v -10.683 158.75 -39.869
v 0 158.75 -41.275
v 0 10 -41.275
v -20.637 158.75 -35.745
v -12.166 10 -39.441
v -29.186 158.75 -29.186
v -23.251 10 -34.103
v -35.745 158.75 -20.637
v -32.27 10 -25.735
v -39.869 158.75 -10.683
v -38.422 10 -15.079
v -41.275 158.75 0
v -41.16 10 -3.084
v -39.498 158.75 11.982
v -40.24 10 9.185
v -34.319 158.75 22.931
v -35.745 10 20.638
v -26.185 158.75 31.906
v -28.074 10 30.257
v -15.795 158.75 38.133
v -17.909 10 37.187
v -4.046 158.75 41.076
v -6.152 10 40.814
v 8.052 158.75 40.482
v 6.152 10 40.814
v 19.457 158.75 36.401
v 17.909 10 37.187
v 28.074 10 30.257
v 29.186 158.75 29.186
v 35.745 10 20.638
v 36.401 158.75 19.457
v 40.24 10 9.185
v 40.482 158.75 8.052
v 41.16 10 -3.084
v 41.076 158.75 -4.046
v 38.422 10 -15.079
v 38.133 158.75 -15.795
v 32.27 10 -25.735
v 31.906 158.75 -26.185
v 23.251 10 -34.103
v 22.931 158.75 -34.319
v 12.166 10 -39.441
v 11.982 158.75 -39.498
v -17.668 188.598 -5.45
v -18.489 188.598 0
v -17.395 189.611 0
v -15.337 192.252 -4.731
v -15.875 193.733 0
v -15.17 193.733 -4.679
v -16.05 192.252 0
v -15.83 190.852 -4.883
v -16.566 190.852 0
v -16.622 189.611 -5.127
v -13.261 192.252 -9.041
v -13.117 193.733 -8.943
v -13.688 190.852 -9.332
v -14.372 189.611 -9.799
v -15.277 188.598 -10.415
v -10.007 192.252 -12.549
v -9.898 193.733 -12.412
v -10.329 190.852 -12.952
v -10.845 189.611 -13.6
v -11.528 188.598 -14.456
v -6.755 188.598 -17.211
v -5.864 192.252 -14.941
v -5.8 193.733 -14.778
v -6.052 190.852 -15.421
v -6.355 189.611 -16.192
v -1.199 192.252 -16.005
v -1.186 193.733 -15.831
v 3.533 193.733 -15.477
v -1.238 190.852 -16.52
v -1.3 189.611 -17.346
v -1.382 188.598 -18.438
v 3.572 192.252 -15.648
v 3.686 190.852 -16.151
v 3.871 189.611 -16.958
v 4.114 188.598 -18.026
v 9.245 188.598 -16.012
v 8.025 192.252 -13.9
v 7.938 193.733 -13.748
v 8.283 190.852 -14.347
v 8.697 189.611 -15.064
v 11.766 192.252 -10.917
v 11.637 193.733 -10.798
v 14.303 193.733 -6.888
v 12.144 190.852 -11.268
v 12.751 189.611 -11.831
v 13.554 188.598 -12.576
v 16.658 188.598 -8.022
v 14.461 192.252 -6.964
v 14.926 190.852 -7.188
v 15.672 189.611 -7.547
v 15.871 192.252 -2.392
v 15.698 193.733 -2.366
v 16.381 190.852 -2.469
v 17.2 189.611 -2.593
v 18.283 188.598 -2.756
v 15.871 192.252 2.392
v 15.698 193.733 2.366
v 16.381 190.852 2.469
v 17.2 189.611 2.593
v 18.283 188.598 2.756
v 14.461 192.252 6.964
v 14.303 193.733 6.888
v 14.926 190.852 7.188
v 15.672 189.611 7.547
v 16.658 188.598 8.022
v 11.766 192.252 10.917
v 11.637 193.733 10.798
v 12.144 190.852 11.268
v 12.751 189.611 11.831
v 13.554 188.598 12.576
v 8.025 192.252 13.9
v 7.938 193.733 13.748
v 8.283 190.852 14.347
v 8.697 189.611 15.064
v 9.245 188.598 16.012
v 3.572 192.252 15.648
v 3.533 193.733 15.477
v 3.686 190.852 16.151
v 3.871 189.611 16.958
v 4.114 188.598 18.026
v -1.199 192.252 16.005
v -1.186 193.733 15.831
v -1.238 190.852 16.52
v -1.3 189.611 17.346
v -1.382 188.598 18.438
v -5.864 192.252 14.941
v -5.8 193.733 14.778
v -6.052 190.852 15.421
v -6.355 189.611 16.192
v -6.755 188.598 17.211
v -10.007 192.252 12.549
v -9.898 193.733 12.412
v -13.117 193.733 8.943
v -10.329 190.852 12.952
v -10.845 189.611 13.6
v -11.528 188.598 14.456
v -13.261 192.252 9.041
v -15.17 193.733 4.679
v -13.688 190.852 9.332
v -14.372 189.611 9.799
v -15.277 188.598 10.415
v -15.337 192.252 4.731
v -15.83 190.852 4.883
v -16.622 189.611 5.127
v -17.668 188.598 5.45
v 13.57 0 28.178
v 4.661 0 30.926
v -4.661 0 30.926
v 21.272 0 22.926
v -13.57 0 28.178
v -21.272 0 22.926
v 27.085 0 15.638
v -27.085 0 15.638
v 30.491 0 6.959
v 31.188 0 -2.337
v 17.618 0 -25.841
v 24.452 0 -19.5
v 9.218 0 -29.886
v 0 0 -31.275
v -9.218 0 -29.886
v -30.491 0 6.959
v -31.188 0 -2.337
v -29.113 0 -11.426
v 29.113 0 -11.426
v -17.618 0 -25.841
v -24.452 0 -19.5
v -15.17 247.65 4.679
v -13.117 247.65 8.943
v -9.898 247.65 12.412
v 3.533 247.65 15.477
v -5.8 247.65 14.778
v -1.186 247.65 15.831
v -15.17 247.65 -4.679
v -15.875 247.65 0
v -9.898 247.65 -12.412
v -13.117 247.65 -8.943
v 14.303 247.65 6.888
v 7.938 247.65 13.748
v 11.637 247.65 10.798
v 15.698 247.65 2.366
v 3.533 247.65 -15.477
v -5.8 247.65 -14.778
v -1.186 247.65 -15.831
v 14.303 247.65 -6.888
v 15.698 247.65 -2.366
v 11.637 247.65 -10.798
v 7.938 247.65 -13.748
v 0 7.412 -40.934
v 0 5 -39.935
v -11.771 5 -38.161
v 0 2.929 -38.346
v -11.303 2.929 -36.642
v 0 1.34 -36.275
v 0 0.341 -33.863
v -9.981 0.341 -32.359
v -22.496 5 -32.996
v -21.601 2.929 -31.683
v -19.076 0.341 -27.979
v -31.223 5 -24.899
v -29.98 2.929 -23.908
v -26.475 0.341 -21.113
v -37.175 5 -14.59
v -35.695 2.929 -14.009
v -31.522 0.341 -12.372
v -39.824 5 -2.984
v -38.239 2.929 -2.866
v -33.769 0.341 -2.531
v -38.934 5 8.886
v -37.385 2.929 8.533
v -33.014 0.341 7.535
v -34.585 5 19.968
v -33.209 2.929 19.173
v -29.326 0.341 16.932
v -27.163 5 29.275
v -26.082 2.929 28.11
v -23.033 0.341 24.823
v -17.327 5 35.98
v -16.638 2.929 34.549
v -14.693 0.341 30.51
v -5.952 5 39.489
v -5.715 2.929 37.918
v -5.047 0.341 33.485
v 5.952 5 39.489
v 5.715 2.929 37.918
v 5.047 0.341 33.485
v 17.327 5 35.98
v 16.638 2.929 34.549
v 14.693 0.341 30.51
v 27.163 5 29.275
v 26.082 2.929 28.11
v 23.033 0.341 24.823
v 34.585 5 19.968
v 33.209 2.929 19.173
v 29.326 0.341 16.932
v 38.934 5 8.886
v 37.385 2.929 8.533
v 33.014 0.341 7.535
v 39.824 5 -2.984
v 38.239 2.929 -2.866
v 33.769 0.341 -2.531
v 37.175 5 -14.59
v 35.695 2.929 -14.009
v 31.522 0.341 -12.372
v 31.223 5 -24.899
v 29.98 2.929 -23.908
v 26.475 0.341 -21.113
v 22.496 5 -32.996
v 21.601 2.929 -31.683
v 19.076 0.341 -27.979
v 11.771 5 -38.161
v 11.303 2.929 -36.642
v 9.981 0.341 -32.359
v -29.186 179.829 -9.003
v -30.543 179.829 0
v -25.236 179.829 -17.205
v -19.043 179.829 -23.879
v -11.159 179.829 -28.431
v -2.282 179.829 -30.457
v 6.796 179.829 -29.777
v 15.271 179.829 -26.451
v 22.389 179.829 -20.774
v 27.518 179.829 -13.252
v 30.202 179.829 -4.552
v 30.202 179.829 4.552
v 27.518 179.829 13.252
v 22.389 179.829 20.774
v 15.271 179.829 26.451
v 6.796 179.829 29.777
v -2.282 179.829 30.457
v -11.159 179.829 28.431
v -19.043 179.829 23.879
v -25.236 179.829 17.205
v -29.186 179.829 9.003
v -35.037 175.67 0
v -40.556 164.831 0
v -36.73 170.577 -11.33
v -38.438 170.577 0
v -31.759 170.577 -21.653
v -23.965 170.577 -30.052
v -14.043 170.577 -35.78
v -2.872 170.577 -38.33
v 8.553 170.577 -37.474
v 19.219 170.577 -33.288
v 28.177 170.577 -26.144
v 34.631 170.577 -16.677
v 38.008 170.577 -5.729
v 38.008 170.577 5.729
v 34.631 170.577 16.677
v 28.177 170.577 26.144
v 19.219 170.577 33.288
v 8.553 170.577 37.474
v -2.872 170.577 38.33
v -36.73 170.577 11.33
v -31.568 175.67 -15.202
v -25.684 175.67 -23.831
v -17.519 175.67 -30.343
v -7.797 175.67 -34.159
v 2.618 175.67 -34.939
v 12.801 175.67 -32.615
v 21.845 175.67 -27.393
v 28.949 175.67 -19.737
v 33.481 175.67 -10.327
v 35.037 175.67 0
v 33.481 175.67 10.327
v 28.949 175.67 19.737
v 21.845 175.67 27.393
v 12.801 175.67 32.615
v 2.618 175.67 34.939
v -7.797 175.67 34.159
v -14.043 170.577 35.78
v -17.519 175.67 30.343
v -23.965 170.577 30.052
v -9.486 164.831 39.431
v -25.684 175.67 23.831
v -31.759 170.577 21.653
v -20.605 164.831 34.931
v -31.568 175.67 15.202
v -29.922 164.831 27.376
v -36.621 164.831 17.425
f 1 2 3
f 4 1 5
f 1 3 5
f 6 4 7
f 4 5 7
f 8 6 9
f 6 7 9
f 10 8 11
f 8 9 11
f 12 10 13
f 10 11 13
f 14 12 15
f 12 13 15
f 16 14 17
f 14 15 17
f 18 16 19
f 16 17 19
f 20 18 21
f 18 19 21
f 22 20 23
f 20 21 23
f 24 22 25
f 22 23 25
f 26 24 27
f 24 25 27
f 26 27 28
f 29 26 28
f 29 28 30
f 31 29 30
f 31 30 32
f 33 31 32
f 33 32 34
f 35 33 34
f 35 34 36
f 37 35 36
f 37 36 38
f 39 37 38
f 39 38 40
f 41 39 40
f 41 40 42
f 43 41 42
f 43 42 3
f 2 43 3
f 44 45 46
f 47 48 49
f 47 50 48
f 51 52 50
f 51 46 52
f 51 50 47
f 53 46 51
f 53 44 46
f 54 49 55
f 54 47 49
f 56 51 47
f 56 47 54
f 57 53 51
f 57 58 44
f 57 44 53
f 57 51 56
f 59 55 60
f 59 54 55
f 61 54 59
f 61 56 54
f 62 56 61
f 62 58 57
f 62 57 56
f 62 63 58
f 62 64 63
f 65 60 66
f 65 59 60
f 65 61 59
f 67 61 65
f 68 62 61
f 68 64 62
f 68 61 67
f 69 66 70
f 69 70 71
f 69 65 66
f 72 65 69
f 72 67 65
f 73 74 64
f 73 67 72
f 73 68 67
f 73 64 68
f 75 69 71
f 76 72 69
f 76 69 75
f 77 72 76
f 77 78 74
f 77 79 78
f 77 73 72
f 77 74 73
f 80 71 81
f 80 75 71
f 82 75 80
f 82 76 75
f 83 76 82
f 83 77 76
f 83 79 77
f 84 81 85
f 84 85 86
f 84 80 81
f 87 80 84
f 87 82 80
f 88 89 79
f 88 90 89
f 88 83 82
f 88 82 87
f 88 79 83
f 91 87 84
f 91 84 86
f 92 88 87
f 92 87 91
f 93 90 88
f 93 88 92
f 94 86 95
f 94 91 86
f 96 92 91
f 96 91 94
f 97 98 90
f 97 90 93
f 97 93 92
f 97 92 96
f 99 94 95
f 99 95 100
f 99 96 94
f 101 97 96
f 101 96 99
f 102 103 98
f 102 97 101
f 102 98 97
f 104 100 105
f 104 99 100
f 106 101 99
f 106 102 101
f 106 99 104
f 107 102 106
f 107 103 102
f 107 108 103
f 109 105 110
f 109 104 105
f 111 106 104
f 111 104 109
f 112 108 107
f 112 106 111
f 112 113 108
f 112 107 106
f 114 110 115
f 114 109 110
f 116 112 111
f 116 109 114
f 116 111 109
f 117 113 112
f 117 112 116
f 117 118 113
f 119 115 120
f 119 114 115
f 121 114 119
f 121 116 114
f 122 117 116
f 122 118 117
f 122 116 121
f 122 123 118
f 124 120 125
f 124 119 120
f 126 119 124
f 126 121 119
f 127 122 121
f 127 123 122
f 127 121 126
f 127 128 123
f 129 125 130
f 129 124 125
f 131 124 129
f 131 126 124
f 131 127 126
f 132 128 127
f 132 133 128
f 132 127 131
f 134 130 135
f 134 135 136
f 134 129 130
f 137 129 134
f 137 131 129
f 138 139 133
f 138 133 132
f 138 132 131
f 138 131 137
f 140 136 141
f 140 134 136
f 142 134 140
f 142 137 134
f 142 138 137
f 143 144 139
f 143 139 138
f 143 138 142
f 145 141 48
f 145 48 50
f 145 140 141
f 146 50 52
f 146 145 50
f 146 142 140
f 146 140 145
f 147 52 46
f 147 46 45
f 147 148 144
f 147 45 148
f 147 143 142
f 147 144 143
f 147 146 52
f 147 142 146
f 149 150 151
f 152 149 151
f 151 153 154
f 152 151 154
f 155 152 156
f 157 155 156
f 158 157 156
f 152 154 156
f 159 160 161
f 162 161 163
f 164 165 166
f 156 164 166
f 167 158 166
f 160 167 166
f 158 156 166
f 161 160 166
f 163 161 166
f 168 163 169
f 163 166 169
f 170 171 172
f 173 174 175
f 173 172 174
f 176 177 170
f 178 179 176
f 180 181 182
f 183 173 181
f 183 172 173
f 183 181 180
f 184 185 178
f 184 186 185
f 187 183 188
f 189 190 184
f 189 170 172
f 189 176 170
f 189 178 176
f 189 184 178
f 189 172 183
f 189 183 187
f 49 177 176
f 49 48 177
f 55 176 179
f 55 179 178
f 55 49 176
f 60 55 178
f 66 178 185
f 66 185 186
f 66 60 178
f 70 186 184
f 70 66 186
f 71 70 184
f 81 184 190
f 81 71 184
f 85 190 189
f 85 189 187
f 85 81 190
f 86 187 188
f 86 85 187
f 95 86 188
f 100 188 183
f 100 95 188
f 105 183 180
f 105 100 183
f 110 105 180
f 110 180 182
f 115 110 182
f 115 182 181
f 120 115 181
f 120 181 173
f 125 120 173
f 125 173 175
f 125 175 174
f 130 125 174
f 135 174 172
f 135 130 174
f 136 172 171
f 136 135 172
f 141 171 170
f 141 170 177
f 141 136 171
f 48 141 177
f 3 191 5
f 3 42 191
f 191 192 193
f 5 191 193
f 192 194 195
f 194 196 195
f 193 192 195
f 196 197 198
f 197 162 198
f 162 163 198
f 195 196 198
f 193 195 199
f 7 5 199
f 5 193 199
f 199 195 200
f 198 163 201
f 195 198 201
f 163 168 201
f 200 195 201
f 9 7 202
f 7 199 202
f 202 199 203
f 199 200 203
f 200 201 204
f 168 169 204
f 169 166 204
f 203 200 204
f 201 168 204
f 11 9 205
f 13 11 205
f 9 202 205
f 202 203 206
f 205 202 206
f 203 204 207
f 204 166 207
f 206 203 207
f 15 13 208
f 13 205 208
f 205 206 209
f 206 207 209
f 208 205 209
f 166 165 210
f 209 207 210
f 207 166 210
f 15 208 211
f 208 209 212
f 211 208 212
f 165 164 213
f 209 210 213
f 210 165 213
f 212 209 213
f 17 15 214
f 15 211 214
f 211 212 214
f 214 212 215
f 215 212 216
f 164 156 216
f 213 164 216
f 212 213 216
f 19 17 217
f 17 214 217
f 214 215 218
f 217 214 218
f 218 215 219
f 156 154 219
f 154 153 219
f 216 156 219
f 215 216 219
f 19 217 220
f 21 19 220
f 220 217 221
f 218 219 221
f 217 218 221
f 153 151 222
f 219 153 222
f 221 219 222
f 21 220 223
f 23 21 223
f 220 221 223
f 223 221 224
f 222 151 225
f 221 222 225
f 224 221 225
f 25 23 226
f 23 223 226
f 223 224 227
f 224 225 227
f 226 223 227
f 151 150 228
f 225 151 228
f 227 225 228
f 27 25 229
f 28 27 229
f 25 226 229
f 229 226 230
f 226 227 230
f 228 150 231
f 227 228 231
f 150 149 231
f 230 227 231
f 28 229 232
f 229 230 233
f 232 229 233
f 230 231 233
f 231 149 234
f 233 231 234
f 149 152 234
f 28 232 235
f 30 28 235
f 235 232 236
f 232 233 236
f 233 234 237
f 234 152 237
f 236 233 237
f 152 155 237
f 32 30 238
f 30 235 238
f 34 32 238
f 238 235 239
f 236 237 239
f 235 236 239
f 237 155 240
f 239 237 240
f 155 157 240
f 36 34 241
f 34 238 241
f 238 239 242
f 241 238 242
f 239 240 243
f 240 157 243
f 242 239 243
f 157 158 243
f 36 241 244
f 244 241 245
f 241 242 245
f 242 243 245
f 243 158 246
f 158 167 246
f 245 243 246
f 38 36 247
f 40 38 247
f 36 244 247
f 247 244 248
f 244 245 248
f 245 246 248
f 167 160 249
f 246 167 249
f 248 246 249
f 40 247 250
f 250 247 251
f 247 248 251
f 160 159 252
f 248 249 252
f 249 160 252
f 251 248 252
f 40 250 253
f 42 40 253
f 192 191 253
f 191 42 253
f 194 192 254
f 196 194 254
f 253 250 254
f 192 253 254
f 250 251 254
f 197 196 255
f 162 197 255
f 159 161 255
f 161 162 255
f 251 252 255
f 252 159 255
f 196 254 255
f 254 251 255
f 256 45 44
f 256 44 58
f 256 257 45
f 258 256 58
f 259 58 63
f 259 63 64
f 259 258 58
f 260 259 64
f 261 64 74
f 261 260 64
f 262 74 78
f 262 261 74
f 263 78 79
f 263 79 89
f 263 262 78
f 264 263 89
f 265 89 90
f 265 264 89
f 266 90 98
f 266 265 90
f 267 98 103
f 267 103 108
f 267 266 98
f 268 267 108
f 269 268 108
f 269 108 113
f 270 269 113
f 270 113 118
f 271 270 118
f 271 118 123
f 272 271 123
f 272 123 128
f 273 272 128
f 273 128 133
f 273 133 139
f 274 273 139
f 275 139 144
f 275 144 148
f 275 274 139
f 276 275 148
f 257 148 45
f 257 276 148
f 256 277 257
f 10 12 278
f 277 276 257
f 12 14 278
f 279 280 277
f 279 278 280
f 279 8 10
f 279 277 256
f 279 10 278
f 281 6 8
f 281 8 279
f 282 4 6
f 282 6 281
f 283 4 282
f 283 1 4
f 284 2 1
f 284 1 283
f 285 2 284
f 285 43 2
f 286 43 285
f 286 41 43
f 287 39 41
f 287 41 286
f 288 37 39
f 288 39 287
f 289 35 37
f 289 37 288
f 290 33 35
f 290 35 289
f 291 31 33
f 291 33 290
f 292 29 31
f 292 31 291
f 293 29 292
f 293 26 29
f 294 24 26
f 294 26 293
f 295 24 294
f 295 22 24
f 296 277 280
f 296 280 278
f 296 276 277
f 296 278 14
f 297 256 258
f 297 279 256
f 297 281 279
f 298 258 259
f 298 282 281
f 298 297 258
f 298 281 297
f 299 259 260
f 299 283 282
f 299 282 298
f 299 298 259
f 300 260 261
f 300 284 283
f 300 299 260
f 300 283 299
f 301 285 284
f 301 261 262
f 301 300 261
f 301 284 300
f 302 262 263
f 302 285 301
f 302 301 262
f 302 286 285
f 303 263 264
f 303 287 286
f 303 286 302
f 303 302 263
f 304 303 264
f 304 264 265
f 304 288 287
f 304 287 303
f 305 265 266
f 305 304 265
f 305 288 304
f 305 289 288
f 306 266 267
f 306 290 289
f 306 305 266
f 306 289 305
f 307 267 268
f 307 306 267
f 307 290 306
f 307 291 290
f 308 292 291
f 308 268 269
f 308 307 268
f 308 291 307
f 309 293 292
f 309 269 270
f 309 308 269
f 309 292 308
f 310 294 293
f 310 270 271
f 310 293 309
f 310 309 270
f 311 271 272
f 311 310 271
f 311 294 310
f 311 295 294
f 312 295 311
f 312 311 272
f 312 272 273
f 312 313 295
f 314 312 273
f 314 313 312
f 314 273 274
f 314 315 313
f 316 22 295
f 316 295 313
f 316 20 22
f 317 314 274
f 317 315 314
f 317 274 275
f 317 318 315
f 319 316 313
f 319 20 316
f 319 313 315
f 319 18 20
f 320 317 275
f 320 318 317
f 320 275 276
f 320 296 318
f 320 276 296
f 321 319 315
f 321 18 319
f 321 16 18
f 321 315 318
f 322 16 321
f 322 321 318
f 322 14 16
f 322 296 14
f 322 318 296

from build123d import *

# Parameters (mm, degrees)
ESQUISSE1_R        = 41.275
BOSS_EXTRU_1_DEPTH = 158.75
CONG_1_R           = 10


with BuildPart() as part:
    # Esquisse1 → Boss.-Extru.1 (new body)
    with BuildSketch(Plane(origin=(0, 0, 0), x_dir=(1, 0, 0), z_dir=(0, 1, 0))):
        with Locations(Location((0, 0, 0), (0, 0, 90))):
            Circle(ESQUISSE1_R)
    extrude(amount=BOSS_EXTRU_1_DEPTH)

    # Esquisse2 → Révolution1 (revolve)
    with BuildSketch(Plane.XY, mode=Mode.PRIVATE) as r_volution1_sk:
        with BuildLine():
            Line((18.489381751, 188.598064752), (30.542749869, 179.829366122))
            ThreePointArc((30.542749869, 179.829366122), (38.437502567, 170.577096738), (41.275, 158.75))
            Line((41.275, 158.75), (0, 158.75))
            Line((0, 158.75), (0, 247.65))
            Line((0, 247.65), (15.875, 247.65))
            Line((15.875, 247.65), (15.875, 193.733009377))
            ThreePointArc((15.875, 193.733009377), (16.56621586, 190.851922419), (18.489381751, 188.598064752))
        make_face()
    revolve(r_volution1_sk.sketch.rotate(Axis((0, 247.65, 0), (0, -1, 0)), 180), axis=Axis((0, 247.65, 0), (0, -1, 0)))

    # Congé1
    cong_1_edges = [part.edges().sort_by_distance(p)[0] for p in [
        (0, 0, 41.275),
    ]]
    fillet(cong_1_edges, radius=CONG_1_R)


solid = part.part
